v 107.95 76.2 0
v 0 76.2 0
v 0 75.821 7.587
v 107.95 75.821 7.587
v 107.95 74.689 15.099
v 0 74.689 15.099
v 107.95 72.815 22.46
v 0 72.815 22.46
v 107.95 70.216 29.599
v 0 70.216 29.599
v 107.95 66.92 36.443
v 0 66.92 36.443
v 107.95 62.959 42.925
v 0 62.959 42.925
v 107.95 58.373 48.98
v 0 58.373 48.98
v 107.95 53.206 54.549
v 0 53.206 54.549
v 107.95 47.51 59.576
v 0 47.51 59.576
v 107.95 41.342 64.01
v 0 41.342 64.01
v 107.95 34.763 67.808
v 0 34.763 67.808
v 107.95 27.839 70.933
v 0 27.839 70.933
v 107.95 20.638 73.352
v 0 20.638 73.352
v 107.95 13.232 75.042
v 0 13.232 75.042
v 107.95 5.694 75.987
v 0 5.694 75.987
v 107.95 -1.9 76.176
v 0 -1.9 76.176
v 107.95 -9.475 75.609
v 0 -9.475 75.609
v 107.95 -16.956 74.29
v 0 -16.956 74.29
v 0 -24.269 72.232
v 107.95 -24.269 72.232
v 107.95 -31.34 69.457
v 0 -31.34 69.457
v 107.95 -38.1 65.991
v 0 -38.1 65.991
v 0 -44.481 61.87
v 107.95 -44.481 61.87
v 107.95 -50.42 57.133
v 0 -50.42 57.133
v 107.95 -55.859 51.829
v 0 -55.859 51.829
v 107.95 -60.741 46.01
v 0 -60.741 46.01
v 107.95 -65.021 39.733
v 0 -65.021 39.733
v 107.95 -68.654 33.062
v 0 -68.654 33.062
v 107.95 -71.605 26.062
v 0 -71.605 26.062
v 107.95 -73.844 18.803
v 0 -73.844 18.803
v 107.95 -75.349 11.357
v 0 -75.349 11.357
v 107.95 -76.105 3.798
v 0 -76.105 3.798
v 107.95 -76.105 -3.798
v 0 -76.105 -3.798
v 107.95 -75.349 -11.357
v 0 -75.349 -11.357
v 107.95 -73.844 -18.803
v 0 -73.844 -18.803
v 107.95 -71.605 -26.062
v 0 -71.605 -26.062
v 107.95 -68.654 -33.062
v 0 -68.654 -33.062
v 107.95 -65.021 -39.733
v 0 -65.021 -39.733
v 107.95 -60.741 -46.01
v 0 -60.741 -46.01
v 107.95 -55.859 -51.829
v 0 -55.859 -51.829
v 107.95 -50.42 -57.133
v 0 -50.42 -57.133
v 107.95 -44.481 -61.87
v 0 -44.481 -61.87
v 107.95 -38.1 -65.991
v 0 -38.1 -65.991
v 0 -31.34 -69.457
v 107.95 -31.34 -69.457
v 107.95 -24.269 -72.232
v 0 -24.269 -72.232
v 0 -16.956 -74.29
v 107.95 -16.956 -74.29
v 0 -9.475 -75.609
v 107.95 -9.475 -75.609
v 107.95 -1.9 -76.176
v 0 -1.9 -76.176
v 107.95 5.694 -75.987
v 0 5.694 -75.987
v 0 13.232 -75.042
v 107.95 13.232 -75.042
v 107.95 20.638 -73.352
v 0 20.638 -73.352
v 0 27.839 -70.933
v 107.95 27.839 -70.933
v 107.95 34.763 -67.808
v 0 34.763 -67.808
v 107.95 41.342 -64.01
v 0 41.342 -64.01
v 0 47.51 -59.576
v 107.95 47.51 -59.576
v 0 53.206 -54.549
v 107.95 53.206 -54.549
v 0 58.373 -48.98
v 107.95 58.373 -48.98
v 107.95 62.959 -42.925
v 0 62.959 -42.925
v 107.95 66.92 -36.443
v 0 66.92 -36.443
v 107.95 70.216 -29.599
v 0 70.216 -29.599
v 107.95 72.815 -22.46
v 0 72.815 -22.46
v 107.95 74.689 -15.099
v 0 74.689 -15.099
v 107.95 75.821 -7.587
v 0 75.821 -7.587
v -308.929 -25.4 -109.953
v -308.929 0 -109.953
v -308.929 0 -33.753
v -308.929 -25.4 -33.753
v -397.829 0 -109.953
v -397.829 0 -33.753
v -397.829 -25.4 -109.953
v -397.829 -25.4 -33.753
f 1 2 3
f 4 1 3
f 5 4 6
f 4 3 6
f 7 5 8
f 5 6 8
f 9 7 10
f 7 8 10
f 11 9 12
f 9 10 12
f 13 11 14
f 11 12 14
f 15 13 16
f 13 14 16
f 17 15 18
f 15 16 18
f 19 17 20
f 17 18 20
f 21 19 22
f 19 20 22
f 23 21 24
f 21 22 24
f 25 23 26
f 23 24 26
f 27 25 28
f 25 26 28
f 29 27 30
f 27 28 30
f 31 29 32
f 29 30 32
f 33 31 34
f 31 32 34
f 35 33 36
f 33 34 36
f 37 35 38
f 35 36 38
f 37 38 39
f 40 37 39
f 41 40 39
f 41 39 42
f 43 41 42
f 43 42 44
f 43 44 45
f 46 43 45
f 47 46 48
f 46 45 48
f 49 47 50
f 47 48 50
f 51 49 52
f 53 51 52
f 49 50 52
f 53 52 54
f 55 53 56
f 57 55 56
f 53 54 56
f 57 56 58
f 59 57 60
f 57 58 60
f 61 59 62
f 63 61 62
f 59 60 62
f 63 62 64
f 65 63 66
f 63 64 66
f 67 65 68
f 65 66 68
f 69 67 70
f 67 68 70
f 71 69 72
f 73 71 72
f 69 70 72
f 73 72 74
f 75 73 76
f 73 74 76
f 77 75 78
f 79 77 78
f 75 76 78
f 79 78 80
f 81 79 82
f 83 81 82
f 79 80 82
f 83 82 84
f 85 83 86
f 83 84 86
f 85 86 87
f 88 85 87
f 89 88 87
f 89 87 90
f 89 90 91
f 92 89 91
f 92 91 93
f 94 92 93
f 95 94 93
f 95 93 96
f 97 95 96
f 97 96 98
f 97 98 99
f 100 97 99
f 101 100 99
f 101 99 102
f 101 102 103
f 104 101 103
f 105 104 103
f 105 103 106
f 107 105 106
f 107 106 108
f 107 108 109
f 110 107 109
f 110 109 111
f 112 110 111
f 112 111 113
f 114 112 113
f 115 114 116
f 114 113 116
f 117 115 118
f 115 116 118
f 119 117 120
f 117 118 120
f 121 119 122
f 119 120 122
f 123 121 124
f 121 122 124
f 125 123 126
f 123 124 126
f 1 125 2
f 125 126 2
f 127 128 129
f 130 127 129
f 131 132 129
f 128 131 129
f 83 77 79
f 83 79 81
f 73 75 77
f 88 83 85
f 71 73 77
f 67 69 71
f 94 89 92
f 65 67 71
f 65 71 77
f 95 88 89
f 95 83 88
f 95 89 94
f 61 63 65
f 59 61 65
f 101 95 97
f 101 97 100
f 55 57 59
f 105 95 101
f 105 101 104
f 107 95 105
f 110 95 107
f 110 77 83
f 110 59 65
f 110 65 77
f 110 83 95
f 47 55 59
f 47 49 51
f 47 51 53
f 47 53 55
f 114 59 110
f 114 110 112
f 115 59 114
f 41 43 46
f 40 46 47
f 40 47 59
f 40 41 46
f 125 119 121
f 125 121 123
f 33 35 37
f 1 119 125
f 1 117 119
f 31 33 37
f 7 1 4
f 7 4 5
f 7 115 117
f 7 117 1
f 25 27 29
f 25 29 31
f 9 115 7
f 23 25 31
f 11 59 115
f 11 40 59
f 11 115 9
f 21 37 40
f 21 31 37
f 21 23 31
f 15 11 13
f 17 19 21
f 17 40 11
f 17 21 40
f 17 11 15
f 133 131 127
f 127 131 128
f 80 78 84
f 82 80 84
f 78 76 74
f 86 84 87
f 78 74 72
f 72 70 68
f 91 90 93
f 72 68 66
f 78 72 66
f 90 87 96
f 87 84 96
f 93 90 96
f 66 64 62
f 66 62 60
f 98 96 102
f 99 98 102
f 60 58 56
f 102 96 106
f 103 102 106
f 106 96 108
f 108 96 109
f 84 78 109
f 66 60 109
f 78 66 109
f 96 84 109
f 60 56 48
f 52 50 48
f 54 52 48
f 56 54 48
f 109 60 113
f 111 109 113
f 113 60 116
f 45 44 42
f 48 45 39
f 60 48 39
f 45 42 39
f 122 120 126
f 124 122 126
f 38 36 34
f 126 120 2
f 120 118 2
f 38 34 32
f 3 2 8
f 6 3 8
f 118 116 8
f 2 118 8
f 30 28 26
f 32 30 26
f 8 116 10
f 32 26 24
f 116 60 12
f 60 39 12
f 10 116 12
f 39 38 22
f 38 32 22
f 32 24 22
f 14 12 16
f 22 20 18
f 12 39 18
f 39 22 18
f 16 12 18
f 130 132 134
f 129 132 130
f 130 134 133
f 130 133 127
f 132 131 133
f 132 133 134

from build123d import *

# Parameters (mm, degrees)
F0_R     = 76.2
F1_DEPTH = 107.95
F2_W     = 88.9
F2_H     = 76.2
F3_DEPTH = 25.4


with BuildPart() as f1:
    # F0 (on Right) → F1 (new body)
    with BuildSketch(Plane.YZ):
        Circle(F0_R)
    extrude(amount=F1_DEPTH)


with BuildPart() as f3:
    # F2 (on Front) → F3 (new body)
    with BuildSketch(Plane.XZ):
        with Locations((-353.379428, -71.853062)):
            Rectangle(F2_W, F2_H)
    extrude(amount=F3_DEPTH)


solid = Compound([f1.part, f3.part])
